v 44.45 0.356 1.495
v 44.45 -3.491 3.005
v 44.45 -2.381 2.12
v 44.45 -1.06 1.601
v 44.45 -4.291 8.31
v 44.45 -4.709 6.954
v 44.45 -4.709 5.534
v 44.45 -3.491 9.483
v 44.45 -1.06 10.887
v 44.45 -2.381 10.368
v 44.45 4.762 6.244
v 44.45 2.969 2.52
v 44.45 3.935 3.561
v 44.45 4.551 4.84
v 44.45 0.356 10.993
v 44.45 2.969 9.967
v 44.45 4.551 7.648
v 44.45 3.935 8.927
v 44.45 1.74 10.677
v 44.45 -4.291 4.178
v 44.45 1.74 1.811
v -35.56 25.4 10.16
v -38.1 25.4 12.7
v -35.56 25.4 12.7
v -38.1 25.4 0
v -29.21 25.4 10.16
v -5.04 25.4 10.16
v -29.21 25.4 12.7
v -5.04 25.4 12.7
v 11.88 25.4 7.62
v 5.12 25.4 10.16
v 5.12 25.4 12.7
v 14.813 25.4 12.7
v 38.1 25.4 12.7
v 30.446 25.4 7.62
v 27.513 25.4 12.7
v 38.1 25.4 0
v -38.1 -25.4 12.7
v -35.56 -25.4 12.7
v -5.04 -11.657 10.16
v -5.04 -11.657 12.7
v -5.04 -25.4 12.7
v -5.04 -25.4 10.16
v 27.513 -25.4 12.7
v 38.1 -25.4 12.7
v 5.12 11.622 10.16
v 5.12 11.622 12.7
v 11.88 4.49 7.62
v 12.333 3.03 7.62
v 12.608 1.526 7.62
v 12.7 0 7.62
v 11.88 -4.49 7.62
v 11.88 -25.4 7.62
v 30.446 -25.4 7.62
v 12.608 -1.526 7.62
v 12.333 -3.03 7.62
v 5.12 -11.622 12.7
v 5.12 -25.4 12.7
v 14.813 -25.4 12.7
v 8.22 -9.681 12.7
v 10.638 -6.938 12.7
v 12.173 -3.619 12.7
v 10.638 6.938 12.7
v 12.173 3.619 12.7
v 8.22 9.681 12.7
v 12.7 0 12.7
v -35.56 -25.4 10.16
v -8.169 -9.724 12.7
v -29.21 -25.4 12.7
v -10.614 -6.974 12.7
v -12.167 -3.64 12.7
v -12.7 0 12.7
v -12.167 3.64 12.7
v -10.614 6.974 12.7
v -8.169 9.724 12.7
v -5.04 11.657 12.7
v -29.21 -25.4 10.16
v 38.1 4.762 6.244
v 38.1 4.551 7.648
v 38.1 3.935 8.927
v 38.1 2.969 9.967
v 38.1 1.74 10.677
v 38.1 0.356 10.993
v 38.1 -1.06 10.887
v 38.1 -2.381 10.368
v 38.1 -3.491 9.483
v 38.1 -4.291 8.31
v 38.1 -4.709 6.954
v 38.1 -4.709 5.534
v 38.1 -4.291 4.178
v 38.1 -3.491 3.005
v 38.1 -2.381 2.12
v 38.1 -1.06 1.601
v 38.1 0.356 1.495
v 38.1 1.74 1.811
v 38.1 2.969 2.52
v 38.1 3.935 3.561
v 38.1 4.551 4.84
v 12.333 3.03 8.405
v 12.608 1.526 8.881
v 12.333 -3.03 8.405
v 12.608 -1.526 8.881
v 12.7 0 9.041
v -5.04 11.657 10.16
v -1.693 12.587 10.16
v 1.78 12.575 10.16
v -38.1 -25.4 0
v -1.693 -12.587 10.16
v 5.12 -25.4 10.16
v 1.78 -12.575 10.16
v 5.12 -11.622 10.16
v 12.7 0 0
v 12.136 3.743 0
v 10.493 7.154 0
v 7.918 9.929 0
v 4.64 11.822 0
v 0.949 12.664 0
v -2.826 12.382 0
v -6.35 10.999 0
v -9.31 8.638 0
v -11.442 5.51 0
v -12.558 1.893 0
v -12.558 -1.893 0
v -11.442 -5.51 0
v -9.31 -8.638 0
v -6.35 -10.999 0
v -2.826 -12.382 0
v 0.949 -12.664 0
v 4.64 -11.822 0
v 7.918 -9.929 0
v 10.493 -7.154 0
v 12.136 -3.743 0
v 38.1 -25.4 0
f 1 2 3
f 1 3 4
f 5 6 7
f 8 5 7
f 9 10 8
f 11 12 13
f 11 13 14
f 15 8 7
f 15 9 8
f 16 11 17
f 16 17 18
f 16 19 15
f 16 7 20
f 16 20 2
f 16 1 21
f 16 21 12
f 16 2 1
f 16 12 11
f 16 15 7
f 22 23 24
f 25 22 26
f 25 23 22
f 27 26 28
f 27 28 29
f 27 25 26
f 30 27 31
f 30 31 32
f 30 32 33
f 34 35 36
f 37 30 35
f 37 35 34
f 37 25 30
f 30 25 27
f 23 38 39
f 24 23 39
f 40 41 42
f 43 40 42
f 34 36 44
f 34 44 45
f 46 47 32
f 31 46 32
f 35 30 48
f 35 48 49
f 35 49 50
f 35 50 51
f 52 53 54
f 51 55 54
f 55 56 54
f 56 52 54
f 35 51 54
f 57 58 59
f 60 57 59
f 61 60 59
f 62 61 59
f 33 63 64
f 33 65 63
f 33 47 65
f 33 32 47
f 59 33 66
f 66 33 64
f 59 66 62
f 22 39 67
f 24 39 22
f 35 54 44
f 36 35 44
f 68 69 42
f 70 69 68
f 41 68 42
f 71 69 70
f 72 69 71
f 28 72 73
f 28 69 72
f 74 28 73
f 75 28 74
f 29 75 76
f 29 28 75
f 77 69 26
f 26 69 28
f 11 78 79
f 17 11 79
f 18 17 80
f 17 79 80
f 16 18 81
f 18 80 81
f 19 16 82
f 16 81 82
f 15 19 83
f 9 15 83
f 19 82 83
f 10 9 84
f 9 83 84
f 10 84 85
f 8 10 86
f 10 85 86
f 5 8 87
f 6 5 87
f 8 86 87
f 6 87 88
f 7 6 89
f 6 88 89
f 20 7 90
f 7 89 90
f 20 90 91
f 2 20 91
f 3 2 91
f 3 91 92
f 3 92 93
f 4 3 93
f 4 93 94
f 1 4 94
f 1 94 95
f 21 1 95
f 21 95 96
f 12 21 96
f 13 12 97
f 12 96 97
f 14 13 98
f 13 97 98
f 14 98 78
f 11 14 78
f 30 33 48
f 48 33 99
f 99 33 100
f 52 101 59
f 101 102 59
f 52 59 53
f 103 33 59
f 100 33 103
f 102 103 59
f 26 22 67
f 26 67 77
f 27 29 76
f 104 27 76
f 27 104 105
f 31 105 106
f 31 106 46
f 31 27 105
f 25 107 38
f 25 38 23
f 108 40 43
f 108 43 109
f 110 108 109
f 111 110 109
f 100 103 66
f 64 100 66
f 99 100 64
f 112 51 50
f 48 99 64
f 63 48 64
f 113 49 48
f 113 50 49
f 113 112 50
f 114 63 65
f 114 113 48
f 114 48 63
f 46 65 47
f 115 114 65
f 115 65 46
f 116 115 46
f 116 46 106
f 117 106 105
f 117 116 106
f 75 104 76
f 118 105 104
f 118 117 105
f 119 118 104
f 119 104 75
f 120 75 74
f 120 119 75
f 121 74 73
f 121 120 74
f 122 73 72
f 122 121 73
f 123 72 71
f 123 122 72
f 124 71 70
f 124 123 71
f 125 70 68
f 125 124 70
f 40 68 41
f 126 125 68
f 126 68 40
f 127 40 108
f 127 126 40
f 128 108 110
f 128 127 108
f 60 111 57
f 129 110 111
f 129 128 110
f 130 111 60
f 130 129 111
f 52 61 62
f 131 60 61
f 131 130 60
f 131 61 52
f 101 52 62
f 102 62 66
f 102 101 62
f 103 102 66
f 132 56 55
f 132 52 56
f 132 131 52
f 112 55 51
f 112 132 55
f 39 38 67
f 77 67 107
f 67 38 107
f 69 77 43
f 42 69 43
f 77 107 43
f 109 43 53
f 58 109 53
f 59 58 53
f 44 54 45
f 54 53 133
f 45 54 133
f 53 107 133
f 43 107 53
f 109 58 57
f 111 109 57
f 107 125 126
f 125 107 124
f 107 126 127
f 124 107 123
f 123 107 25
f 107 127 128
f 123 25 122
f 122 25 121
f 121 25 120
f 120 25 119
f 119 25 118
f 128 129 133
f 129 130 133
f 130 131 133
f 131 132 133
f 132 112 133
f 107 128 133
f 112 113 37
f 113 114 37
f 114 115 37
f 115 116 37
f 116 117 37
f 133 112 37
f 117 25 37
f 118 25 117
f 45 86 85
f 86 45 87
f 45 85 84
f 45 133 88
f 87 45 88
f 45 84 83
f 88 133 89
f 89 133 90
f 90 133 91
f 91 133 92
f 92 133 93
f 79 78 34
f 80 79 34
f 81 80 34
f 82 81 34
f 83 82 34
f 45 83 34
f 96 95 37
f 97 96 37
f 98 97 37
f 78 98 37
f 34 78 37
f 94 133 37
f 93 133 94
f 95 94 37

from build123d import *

# Parameters (mm, degrees)
F0_W     = 76.2
F0_H     = 50.8
F0_R     = 12.7
F1_DEPTH = 12.7
F2_W     = 6.35
F2_H     = 50.8
F3_DEPTH = 2.54
F5_DEPTH = 50.8
F6_R     = 4.7625
F7_DEPTH = 6.35


with BuildPart() as f1:
    # F0 (on Top) → F1 (new body)
    with BuildSketch(Plane.XY):
        Rectangle(F0_W, F0_H)
        Circle(F0_R, mode=Mode.SUBTRACT)
    extrude(amount=F1_DEPTH)

    # F2 (on face) → F3 (cut)
    with BuildSketch(Plane.XY.offset(12.7)):
        with Locations((-32.385, 0)):
            Rectangle(F2_W, F2_H)
        with BuildLine():
            Line((-5.039626, -11.65728), (-5.039626, -25.4))
            Line((-5.039626, -25.4), (5.120374, -25.4))
            Line((5.120374, -25.4), (5.120374, -11.622038))
            ThreePointArc((5.120374, -11.622038), (0.044052, -12.699924), (-5.039626, -11.65728))
        make_face()
        with BuildLine():
            Line((5.120374, 25.4), (-5.039626, 25.4))
            Line((-5.039626, 25.4), (-5.039626, 11.65728))
            ThreePointArc((-5.039626, 11.65728), (0.044052, 12.699924), (5.120374, 11.622038))
            Line((5.120374, 11.622038), (5.120374, 25.4))
        make_face()
    extrude(amount=-F3_DEPTH, mode=Mode.SUBTRACT)

    # F4 (on face) → F5 (cut, through all)
    with BuildSketch(Plane.XZ.offset(25.4)):
        Polygon((27.512688, 12.7), (14.812688, 12.7), (11.879749, 7.62), (30.445627, 7.62), align=None)
    extrude(amount=-F5_DEPTH, mode=Mode.SUBTRACT)

    # F6 (on face) → F7 (join)
    with BuildSketch(Plane.YZ.offset(38.1)):
        with Locations((0, 6.243965)):
            Circle(F6_R)
    extrude(amount=F7_DEPTH)


solid = f1.part
